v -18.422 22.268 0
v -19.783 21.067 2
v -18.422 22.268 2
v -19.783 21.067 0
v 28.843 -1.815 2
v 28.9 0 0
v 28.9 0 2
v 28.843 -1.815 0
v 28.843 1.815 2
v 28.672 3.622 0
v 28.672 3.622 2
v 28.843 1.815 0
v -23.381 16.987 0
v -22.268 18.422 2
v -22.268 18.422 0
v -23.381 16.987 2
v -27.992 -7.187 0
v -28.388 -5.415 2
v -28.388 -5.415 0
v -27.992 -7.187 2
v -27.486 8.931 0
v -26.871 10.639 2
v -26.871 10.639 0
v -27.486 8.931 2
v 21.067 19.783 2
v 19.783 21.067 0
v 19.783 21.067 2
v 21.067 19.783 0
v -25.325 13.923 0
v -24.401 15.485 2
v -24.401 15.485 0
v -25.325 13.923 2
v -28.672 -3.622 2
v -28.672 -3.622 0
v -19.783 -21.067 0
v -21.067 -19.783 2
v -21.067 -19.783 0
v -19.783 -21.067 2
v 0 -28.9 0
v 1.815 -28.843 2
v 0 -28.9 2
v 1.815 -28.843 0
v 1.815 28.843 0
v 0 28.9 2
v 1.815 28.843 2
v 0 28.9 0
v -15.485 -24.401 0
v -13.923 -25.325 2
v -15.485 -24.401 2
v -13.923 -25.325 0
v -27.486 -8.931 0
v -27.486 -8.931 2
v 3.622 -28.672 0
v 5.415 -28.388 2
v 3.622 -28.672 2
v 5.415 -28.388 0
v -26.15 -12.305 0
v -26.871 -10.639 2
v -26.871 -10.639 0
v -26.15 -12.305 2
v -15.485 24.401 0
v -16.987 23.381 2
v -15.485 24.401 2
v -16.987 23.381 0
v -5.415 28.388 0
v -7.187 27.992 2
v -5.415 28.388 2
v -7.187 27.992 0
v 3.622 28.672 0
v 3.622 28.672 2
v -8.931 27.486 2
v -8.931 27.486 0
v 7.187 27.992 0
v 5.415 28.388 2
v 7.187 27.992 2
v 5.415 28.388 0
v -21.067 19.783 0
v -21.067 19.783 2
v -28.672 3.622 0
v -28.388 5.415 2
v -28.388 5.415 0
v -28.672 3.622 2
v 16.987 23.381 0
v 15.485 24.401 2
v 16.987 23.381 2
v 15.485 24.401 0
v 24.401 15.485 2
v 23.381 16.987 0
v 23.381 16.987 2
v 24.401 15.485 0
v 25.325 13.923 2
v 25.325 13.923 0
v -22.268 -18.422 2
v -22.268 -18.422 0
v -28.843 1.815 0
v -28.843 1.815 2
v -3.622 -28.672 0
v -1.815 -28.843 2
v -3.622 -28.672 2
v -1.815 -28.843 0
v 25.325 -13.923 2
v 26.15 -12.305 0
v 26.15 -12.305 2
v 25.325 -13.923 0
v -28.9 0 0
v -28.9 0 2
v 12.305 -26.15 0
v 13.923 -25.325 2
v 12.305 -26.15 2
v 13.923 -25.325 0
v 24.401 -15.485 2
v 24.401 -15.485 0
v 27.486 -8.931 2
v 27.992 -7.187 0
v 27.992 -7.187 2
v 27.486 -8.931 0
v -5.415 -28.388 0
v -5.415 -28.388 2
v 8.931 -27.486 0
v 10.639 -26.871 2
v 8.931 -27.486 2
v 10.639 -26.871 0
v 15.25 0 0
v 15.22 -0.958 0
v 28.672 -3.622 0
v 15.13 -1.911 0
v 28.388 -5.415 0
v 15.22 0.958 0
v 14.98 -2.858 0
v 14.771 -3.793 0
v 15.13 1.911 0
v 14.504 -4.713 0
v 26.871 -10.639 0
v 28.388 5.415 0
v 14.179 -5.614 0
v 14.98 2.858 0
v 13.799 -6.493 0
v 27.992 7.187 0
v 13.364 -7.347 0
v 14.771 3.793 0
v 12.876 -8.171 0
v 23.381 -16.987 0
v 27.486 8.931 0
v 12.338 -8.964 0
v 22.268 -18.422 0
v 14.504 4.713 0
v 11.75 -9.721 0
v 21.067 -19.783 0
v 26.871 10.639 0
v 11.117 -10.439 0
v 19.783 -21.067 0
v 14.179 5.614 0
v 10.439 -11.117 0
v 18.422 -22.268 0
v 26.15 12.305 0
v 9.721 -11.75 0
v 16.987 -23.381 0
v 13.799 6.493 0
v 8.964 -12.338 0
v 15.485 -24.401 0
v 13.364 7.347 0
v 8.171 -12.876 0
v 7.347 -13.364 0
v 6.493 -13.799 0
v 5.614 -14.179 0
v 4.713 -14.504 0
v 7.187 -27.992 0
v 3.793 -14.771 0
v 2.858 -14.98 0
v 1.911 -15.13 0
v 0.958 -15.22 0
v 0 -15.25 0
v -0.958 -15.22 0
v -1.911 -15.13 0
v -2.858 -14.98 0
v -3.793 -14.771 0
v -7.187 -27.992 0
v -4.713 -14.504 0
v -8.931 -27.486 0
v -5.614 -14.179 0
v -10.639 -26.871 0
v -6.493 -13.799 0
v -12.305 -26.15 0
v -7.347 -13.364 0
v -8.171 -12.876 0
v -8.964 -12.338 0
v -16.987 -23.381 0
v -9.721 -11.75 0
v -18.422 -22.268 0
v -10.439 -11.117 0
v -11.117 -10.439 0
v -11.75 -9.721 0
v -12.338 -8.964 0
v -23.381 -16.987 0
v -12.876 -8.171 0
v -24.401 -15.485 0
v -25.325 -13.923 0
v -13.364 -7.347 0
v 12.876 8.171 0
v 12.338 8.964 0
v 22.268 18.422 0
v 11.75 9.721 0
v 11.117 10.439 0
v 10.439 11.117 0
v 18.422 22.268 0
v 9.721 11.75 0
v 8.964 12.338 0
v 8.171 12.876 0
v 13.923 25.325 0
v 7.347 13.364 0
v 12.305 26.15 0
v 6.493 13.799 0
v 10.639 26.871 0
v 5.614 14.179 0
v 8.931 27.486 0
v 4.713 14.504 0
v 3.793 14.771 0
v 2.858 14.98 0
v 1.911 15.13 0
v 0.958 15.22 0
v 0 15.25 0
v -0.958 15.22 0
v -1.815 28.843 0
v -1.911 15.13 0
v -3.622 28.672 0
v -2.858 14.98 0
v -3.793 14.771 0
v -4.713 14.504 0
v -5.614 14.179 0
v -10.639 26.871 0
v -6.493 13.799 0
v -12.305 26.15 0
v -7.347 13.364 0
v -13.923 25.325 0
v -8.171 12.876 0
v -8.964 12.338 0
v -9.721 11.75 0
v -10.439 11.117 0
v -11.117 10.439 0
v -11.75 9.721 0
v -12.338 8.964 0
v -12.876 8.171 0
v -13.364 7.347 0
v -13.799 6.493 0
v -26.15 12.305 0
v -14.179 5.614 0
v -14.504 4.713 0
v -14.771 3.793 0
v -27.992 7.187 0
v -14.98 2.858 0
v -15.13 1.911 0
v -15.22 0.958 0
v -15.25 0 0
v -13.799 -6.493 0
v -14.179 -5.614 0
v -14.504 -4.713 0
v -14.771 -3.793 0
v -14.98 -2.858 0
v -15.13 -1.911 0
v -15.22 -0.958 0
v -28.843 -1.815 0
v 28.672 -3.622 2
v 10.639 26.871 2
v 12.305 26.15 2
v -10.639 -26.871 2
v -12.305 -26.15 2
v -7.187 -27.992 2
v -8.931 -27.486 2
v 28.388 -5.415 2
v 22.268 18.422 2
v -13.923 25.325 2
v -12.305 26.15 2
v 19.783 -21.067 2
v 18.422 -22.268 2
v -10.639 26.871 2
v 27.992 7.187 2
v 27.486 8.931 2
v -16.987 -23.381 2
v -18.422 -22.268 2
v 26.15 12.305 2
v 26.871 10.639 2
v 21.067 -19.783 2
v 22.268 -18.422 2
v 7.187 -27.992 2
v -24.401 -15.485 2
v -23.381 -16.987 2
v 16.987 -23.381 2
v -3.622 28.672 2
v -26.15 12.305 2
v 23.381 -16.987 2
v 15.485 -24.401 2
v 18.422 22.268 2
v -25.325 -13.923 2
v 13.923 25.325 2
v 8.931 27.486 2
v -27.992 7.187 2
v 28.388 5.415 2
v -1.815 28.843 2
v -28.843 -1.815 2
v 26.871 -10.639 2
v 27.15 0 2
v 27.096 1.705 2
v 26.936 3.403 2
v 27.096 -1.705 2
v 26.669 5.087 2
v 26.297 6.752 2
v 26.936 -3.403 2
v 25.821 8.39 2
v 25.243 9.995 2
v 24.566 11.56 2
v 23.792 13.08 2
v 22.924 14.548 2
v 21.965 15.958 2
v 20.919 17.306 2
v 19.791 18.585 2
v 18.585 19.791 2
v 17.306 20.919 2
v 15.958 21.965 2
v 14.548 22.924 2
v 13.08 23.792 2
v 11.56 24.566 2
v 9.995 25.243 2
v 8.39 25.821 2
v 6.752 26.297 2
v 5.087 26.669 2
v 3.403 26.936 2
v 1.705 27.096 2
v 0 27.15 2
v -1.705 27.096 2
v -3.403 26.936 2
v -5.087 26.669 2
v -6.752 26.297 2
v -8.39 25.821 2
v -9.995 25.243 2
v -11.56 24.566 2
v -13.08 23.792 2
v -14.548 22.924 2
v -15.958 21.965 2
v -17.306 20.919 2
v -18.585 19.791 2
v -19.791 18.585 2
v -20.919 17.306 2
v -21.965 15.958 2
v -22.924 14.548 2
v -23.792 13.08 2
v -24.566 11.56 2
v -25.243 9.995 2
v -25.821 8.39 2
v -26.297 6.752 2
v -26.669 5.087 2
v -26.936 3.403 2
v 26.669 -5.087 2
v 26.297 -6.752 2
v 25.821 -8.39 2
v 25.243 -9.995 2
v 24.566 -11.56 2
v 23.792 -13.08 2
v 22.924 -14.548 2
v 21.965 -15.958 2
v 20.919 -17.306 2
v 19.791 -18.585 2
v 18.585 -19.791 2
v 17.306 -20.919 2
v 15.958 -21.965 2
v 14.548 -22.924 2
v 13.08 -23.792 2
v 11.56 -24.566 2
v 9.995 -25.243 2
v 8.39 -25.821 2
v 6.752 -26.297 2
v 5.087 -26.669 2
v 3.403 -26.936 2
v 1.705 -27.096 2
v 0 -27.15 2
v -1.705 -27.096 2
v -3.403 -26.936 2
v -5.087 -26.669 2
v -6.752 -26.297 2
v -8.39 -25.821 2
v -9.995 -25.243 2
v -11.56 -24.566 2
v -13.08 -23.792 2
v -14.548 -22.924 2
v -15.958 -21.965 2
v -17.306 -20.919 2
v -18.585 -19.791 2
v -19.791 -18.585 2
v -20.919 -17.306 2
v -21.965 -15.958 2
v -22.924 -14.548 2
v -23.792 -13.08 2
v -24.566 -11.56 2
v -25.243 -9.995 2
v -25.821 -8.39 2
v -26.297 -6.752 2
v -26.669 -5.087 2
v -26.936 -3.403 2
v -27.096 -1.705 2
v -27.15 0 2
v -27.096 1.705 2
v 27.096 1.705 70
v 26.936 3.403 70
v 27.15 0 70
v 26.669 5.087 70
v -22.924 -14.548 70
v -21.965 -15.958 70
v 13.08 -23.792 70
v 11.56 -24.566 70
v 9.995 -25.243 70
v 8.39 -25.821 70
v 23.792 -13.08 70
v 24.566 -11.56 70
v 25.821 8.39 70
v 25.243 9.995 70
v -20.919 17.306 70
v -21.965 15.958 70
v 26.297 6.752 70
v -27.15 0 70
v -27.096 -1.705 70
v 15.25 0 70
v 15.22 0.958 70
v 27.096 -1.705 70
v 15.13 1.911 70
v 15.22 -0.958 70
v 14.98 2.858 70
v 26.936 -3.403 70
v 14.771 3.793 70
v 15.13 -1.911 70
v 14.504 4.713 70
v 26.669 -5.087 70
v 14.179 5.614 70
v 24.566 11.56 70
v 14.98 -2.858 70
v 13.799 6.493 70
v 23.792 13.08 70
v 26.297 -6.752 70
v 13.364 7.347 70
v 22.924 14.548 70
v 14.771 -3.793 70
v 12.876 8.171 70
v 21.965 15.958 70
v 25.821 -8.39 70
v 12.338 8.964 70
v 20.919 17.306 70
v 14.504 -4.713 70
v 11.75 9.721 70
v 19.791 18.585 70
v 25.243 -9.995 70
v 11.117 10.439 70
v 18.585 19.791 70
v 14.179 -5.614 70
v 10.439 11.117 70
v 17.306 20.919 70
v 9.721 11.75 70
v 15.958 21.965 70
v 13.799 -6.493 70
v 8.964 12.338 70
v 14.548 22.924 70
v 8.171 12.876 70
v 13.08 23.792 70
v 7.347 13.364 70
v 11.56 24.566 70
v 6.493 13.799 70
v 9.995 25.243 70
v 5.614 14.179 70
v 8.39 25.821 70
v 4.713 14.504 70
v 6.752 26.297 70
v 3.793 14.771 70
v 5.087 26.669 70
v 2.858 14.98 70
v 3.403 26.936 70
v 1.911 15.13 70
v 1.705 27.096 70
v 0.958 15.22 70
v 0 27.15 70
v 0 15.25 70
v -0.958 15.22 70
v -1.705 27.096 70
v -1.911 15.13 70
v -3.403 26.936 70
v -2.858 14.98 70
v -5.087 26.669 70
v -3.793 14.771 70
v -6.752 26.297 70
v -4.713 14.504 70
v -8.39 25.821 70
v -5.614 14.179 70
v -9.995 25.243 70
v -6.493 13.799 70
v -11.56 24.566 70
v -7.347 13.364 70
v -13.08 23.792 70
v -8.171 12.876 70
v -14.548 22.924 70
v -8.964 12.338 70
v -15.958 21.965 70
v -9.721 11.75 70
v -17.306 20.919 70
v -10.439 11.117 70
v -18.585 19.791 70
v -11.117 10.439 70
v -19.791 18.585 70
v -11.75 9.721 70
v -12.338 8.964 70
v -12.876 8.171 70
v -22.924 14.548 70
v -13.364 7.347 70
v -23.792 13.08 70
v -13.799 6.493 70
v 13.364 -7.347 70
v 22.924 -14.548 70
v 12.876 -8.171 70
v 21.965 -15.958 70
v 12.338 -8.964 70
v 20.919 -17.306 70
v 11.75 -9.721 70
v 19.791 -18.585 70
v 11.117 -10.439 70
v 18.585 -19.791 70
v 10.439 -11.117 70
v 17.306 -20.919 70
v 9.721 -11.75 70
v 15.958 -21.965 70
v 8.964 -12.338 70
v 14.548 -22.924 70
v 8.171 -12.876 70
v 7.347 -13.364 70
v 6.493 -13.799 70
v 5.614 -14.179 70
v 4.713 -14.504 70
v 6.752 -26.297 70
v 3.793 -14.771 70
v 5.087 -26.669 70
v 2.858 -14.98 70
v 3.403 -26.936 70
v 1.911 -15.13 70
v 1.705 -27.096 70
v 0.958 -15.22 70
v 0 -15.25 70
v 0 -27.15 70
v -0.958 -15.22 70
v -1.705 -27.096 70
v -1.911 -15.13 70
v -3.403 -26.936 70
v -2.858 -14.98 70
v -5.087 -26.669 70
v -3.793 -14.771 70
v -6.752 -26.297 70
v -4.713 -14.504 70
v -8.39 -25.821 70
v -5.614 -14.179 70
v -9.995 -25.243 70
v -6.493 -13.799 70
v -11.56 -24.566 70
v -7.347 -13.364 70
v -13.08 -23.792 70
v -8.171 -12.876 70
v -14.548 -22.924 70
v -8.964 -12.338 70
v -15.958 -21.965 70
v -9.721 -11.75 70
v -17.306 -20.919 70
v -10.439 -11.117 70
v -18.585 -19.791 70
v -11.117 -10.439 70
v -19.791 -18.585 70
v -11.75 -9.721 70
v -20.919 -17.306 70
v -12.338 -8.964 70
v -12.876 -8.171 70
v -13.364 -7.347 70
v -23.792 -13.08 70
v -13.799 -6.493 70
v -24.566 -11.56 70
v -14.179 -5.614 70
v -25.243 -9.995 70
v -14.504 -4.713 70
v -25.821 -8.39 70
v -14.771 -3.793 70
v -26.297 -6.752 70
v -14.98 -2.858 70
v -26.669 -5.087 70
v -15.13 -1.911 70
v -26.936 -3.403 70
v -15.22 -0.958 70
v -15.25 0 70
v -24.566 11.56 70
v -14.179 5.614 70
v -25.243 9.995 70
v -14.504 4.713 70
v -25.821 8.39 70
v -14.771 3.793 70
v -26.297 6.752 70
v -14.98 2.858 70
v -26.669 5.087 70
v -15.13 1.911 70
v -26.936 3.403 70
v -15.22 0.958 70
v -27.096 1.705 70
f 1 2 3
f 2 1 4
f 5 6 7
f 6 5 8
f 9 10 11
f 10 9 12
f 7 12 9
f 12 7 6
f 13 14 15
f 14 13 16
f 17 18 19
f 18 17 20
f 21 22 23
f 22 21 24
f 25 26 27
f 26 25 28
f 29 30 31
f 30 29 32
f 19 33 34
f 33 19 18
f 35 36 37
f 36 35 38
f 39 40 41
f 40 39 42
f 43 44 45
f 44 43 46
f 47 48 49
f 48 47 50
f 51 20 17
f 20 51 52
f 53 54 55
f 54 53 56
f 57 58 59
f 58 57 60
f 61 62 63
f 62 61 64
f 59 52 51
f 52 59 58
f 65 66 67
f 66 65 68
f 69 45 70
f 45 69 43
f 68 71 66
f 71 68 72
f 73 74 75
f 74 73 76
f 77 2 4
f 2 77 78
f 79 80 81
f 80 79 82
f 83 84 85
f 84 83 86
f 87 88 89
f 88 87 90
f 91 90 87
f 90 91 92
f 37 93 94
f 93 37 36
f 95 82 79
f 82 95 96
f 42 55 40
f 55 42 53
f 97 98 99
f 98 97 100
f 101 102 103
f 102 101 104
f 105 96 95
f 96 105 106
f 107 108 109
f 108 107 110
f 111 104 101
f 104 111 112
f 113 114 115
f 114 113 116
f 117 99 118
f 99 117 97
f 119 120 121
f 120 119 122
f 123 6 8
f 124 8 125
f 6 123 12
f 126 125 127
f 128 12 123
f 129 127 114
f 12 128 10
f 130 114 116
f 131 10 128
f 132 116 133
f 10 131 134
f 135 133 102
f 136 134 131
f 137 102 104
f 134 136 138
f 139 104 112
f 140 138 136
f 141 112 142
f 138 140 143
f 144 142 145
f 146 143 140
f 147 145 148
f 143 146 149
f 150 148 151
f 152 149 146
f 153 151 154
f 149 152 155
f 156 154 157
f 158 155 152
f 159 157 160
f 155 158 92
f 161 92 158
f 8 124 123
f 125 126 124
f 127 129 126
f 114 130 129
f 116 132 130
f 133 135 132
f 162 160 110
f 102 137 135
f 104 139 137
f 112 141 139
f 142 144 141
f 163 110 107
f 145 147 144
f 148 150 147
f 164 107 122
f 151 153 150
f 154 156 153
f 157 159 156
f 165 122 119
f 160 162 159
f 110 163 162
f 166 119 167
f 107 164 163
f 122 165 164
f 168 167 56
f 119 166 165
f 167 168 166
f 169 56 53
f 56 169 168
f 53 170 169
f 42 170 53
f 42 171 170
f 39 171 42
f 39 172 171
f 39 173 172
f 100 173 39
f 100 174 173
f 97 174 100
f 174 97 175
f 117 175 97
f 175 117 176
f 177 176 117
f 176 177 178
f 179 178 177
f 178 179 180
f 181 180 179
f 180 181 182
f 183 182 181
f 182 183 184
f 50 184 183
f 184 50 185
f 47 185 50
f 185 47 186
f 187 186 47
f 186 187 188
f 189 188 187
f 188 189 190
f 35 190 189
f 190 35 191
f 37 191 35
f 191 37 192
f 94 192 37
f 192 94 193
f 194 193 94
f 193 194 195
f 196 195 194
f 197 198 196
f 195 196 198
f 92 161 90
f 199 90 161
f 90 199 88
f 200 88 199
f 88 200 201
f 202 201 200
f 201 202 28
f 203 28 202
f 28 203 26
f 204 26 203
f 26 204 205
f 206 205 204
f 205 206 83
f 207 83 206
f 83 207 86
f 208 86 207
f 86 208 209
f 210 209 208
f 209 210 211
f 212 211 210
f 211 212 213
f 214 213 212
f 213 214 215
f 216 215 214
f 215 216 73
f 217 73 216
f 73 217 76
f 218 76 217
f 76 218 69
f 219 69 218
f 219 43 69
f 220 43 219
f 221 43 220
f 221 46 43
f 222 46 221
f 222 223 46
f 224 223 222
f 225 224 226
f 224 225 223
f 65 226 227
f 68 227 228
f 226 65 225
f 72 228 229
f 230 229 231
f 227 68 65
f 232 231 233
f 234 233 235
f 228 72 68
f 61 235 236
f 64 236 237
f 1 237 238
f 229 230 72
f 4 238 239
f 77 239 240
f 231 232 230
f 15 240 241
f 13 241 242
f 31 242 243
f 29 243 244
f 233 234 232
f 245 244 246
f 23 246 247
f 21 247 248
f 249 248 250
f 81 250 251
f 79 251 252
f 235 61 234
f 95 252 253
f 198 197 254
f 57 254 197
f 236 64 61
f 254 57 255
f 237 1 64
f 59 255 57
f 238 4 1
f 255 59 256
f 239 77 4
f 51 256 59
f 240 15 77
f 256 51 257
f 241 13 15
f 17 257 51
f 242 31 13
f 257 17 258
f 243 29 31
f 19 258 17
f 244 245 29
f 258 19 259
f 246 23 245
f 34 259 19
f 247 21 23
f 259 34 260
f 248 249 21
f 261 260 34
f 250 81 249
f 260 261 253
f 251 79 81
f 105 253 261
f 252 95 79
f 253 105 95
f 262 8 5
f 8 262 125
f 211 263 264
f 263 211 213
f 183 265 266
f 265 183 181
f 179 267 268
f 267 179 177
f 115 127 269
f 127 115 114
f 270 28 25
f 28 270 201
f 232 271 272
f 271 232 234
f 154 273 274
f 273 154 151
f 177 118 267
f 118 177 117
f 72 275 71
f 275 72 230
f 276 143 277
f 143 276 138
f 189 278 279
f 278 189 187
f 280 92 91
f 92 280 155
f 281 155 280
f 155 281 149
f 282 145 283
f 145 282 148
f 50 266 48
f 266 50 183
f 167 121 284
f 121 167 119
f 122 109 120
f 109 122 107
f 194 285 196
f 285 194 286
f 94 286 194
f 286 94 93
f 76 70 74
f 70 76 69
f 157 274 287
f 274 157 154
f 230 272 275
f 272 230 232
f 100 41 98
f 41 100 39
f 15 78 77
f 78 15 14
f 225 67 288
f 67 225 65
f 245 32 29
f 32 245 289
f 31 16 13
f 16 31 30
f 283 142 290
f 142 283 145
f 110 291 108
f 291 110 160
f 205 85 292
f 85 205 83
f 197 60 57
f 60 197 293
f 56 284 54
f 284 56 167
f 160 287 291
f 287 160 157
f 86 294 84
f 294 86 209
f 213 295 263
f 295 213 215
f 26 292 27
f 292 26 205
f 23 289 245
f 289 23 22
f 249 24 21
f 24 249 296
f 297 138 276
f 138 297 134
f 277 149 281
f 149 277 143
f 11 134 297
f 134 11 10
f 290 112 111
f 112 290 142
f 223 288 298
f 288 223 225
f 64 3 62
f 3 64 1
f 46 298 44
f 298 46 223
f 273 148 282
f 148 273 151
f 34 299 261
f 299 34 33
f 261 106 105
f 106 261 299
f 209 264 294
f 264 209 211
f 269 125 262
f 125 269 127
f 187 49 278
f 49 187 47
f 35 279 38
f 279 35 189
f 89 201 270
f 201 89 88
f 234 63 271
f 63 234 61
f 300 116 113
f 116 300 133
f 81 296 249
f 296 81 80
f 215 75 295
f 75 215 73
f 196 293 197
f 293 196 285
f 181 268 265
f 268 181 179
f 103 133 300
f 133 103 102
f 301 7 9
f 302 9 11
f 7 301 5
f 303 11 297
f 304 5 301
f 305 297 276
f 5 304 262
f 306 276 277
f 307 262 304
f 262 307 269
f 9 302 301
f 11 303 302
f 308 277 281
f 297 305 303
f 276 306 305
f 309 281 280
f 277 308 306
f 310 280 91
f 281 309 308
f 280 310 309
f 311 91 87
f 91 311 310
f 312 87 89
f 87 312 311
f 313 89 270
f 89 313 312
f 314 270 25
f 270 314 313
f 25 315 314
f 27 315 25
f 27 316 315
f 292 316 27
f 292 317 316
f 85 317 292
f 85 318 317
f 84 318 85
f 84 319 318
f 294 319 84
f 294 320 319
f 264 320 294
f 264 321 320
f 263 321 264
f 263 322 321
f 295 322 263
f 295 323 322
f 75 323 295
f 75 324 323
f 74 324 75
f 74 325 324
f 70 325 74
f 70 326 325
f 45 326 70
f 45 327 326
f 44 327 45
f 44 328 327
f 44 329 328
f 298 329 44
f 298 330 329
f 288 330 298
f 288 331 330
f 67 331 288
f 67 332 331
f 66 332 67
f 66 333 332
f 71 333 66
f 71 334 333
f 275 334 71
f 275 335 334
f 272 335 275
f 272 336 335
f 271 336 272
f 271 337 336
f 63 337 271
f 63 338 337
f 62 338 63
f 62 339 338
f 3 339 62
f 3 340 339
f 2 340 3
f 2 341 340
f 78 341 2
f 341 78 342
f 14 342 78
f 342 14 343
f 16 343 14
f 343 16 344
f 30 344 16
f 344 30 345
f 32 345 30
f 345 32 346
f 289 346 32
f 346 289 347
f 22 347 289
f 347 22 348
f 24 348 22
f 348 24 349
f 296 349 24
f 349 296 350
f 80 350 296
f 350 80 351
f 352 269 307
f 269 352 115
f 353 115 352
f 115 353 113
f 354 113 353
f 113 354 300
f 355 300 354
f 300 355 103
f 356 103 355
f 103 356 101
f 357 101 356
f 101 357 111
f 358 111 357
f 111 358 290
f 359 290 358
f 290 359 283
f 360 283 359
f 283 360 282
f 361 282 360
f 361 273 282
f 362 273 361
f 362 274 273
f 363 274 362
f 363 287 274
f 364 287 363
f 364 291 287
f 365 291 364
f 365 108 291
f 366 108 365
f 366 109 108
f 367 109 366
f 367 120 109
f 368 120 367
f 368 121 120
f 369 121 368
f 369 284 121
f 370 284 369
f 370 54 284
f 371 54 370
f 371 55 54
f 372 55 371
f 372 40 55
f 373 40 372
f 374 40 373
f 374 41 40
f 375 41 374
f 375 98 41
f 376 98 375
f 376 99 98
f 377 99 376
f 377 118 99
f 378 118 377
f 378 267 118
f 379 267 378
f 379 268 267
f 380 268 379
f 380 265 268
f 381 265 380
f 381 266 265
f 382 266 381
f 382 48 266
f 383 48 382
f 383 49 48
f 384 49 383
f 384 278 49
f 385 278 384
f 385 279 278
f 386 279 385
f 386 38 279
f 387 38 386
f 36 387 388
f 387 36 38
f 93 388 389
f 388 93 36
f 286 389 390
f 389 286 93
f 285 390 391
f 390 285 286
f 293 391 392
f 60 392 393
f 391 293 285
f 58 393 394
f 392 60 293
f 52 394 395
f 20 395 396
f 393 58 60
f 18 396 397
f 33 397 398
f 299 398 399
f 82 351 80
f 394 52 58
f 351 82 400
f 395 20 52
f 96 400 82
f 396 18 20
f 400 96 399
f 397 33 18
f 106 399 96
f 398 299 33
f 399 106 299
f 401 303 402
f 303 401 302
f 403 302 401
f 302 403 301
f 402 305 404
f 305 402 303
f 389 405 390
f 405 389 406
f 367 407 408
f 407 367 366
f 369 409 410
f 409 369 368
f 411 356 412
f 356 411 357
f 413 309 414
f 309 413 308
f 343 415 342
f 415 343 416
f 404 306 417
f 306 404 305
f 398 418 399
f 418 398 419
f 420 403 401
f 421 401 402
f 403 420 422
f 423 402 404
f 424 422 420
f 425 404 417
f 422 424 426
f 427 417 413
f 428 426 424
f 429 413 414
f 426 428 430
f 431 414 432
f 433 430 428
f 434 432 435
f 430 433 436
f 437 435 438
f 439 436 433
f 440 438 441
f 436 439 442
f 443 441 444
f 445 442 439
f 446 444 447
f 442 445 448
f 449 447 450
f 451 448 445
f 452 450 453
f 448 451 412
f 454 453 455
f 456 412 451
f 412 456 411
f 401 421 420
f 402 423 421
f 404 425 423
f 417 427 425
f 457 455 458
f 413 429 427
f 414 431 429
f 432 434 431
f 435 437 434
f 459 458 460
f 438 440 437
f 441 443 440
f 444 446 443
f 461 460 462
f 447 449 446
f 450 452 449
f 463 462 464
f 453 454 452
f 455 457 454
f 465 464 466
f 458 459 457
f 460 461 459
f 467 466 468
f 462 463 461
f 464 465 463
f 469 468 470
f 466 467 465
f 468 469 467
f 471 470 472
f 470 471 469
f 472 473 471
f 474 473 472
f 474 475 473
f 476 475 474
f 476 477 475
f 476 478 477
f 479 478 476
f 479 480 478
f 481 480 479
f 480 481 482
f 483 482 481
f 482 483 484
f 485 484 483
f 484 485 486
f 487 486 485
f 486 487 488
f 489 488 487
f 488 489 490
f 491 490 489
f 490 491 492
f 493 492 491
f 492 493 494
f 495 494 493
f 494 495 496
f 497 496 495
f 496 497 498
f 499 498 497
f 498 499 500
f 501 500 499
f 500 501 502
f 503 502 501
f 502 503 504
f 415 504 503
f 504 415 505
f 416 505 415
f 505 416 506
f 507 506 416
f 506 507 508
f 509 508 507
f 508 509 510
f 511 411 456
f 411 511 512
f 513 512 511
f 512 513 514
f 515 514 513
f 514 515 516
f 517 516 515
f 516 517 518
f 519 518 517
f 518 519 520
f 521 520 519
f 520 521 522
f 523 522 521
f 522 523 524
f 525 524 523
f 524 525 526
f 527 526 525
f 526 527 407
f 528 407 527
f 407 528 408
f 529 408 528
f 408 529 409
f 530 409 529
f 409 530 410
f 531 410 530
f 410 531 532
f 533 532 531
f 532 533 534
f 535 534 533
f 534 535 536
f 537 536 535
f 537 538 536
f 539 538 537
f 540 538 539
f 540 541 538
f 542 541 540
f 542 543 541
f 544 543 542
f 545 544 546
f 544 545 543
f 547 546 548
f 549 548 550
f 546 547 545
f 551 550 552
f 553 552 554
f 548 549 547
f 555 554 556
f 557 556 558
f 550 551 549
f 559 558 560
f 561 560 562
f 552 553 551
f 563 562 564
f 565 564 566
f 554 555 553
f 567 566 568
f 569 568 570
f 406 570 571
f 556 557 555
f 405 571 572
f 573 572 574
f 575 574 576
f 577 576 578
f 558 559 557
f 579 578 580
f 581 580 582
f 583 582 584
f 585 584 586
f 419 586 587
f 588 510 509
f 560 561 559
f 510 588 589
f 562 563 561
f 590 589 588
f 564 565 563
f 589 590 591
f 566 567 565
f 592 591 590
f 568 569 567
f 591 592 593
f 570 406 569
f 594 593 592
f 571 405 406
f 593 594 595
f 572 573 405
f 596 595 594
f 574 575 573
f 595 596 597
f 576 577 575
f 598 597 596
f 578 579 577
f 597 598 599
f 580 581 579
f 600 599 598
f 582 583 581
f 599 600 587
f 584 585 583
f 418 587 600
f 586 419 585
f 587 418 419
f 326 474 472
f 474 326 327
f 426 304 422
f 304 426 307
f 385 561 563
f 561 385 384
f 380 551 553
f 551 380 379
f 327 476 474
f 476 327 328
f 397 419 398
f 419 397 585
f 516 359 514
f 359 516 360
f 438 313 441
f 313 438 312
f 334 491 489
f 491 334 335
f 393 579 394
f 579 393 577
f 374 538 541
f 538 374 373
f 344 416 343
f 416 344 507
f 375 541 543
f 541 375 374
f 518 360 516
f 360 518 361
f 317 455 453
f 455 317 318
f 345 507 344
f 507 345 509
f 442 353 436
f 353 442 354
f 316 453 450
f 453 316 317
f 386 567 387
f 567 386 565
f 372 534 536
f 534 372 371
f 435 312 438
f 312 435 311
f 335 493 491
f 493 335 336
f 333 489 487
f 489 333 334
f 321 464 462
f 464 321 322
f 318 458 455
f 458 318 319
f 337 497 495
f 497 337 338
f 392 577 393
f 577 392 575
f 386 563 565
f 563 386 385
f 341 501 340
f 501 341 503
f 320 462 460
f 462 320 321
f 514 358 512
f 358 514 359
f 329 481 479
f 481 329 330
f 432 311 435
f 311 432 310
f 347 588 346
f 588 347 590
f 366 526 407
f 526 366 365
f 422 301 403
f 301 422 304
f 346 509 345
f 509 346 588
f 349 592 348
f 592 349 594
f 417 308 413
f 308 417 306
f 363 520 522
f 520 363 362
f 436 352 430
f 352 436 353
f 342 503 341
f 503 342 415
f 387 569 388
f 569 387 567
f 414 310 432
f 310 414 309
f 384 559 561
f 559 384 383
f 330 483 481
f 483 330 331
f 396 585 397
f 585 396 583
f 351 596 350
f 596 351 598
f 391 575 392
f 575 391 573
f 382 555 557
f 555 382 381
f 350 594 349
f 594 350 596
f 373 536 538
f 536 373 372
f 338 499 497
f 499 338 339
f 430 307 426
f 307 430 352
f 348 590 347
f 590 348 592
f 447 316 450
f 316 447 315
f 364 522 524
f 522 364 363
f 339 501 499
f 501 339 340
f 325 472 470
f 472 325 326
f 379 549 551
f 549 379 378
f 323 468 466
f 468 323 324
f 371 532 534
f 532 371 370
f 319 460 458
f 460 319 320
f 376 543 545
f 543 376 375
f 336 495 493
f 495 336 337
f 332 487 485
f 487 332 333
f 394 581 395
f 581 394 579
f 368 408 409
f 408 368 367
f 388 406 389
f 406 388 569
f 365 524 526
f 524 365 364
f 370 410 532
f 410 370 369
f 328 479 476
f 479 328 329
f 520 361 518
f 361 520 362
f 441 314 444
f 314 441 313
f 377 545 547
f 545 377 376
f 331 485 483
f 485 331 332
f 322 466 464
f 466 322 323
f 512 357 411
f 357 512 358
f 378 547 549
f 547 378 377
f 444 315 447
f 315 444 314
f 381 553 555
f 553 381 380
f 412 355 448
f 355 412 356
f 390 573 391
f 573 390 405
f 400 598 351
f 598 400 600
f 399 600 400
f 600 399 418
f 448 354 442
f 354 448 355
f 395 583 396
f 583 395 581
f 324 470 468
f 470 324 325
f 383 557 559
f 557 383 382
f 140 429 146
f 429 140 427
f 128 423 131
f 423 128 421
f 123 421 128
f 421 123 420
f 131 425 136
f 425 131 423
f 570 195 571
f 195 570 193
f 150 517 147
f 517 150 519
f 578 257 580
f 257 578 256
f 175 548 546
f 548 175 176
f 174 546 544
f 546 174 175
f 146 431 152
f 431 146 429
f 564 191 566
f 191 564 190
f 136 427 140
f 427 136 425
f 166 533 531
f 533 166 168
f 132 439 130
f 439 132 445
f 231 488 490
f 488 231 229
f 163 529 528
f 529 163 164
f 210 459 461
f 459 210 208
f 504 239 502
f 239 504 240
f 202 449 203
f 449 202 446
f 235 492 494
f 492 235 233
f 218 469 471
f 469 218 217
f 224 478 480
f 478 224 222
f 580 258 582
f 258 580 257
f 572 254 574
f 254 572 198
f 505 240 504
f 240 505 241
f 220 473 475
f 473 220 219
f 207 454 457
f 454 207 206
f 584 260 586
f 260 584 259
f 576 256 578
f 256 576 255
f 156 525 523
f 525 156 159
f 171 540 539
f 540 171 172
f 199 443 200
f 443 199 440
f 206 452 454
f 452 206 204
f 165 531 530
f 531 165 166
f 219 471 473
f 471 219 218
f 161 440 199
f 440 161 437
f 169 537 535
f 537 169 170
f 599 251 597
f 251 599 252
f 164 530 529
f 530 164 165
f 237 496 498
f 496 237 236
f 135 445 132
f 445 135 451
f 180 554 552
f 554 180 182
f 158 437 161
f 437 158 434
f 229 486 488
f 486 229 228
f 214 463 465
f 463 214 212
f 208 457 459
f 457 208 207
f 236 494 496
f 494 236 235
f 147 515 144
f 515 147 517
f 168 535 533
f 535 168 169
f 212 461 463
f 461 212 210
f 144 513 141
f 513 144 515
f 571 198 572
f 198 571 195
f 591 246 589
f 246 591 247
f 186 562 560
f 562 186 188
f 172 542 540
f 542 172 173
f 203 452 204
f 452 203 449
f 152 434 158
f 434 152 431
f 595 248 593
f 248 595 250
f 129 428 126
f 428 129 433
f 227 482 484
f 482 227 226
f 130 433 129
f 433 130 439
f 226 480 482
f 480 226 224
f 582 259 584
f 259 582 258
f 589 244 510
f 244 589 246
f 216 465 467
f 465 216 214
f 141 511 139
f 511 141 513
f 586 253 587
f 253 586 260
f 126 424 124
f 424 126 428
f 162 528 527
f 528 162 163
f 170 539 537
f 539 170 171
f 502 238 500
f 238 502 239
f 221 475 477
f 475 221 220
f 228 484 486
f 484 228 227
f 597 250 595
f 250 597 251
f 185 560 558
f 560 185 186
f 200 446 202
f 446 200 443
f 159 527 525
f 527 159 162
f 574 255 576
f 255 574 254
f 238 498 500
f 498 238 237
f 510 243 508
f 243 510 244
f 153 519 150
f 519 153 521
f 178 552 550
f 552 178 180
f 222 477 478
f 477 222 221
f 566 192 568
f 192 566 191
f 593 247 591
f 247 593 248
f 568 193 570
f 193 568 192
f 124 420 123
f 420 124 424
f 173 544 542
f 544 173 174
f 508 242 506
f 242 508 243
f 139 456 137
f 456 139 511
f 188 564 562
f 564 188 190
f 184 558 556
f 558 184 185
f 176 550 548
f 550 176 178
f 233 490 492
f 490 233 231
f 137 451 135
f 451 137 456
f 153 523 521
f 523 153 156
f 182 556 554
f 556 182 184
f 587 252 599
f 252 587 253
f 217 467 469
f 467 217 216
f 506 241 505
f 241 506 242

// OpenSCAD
// All measurements are in mm.

// Hatchbox: 68 x 54.8
// 3D Solutech: 60 x 57.8
// Melca: 54 x 54
// Dikale: 62.7 x 57
// Tianse: 72.8 x 56.1

// The depth of the hole that the spool is filling. I.e., the width of the spool.
hole_depth = 68;

// The diameter of the hole that the spool is filling. Measure this as accurately as possible, we'll make leeway adjustments later.
hole_diameter = 54.8;

// The diameter of the hub around which the spool hub will turn. Measure this as accurately as possible, we'll make leeway adjustments later.
hub_diameter = 30;

// The thickness of the lip edge.
lip_thickness = 2.0;

// The width of the lip edge.
lip_width = 1.5;

// Allow this much space around the spool and hub.
leeway = 0.5;

// preview[view:north east, tilt:top diagonal]

$fn = 100;
difference() {
    union() {
        cylinder(
            lip_thickness,
            (hole_diameter / 2) + lip_width,
            (hole_diameter / 2) + lip_width
        );
        translate([0, 0, lip_thickness])
            cylinder(
                hole_depth,
                (hole_diameter / 2) - (leeway / 2),
                (hole_diameter / 2) - (leeway / 2)
            );
    }
    translate([0, 0, -5])
        cylinder(
            hole_depth + 10,
            (hub_diameter / 2) + (leeway / 2),
            (hub_diameter / 2) + (leeway / 2)
        );
}
